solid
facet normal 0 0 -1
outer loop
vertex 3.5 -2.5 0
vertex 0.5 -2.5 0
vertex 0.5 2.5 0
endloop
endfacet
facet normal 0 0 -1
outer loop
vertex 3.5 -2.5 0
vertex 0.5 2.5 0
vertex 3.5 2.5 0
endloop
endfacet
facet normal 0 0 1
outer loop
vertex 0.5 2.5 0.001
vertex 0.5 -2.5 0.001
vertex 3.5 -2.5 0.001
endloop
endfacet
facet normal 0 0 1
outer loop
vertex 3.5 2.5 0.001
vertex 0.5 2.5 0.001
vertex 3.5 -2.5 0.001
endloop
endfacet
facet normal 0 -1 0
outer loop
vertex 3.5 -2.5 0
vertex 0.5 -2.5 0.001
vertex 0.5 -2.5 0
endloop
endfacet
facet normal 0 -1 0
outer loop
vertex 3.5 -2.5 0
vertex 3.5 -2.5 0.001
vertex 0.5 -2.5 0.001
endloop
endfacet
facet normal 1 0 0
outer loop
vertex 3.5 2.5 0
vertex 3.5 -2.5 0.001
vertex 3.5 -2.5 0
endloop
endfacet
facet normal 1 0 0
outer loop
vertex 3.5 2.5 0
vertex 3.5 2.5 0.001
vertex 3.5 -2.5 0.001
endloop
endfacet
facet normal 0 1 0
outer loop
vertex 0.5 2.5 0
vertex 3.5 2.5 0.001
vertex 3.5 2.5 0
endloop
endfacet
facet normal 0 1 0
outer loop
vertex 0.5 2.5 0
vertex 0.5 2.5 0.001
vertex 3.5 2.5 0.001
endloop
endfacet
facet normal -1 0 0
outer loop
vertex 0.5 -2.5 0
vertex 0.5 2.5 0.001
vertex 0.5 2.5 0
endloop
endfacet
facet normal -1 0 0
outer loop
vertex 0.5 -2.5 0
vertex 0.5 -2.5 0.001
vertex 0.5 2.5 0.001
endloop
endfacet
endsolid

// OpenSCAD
linear_extrude(height=0.001) {
    translate(v=[2, 0]) {
        square(size=[3, 5], center=true);
    };
};
